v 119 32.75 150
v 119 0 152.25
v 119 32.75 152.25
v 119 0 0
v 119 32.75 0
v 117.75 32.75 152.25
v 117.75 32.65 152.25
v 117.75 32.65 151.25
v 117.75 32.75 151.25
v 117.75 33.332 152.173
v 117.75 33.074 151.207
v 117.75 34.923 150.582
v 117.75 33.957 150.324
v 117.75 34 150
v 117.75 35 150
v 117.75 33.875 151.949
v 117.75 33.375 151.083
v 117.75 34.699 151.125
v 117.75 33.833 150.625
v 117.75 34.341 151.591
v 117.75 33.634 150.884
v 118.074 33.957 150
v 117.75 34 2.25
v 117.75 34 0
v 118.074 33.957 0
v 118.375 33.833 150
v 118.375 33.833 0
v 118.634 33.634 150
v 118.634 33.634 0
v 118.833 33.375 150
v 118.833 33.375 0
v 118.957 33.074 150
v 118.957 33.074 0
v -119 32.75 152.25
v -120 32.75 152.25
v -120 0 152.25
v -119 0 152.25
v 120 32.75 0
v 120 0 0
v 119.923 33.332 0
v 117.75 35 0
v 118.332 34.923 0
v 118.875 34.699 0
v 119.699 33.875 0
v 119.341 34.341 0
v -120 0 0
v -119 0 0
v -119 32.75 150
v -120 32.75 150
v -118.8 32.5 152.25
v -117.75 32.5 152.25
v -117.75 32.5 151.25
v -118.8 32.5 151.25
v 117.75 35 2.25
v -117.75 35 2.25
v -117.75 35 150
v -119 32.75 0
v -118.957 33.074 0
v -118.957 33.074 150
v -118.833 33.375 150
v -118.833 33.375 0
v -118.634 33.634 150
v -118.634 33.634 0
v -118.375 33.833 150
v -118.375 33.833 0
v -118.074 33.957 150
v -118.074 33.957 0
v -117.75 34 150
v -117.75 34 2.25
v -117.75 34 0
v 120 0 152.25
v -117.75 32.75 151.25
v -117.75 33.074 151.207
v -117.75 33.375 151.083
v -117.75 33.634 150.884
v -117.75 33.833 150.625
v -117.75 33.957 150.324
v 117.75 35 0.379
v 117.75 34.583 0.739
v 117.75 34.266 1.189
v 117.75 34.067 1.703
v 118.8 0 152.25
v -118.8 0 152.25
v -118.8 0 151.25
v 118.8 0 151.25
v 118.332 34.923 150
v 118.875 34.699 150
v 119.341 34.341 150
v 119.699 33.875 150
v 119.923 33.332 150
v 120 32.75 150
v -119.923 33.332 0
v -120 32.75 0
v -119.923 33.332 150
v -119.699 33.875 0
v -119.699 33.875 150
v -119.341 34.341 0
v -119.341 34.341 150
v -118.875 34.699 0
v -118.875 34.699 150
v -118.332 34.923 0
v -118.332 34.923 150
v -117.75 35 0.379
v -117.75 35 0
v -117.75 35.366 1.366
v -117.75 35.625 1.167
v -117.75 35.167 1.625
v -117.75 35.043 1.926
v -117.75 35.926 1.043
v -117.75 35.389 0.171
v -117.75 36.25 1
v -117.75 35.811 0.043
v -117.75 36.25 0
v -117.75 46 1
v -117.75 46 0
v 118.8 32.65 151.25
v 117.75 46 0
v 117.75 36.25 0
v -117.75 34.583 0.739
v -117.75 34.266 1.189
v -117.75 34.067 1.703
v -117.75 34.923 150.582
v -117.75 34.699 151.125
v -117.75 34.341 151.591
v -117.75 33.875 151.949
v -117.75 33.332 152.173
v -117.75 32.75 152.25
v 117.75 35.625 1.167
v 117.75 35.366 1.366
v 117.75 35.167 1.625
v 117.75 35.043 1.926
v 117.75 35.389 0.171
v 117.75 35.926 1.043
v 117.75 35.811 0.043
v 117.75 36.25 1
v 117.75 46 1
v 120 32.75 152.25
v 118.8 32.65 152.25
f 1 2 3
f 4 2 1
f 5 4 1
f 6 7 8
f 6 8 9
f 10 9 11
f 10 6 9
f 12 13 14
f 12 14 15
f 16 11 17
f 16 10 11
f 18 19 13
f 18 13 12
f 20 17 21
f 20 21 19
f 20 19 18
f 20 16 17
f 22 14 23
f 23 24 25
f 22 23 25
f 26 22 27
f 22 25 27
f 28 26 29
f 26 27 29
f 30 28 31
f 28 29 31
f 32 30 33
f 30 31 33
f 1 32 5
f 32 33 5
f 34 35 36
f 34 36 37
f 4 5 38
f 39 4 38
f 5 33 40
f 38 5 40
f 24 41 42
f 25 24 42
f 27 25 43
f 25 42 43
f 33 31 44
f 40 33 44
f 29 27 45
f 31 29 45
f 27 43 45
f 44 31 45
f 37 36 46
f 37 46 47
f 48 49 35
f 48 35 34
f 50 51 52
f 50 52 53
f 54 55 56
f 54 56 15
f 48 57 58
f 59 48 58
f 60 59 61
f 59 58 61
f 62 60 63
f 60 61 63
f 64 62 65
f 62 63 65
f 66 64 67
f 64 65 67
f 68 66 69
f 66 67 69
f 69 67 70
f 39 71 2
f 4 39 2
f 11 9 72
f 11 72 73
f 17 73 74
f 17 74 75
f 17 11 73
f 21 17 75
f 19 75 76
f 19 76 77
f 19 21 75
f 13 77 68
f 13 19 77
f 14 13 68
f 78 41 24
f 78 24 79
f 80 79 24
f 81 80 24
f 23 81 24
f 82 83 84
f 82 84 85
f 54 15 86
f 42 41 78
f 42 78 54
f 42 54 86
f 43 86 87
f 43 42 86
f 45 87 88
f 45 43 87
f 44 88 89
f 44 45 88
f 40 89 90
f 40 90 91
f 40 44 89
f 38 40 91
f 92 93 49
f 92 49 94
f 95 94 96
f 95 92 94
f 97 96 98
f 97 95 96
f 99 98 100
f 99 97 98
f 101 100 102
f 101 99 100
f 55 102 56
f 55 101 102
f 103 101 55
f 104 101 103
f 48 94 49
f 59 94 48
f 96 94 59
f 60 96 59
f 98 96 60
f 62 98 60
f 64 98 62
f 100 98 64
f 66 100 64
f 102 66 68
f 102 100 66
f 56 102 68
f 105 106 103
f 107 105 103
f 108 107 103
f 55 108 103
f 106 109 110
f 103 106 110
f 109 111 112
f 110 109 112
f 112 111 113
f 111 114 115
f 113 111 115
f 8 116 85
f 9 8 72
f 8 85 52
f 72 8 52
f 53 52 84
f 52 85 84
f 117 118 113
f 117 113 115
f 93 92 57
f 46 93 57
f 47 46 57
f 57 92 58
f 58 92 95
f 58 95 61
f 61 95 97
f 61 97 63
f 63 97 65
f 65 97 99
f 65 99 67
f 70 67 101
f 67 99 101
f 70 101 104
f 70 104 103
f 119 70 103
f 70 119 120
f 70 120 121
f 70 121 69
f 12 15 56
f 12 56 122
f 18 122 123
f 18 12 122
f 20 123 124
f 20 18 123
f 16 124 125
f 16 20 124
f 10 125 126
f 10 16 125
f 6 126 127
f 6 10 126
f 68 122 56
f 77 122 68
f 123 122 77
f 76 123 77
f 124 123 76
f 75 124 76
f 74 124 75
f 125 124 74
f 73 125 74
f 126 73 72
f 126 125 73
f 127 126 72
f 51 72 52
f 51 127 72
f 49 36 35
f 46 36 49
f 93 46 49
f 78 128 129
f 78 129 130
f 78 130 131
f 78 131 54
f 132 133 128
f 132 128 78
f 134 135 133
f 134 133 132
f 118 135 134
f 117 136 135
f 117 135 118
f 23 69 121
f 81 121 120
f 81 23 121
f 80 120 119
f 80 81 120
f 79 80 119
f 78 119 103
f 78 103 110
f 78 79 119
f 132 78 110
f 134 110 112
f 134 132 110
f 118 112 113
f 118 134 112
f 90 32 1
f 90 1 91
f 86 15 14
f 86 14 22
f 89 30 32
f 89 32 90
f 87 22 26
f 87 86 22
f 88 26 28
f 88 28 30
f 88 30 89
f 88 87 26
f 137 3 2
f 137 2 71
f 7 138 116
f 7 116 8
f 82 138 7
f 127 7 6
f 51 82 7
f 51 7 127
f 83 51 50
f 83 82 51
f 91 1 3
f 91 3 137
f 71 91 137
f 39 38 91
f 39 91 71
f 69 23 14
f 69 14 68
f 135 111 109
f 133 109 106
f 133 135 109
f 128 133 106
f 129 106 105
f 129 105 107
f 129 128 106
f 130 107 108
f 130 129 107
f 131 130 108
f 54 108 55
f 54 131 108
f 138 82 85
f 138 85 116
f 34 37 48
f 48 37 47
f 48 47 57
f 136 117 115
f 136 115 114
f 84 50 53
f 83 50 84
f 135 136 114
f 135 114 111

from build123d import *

# Parameters (mm, degrees)
EXTRUDE1_DEPTH               = 150
SHEET_METAL_1_DEPTH          = 150
SHEET_METAL_1_2_DEPTH        = 150
EDGE_FLANGE1_STRIP_W         = 6.5
EDGE_FLANGE1_STRIP_H         = 1
EDGE_FLANGE1_STRIP_CUT_DEPTH = 235.5
EDGE_FLANGE1_DEPTH           = 235.5
SKETCH16_W                   = 1
SKETCH16_H                   = 32.75
EXTRUDE2_DEPTH               = 2.25
EDGE_FLANGE2_DEPTH           = 235.5
EDGE_FLANGE2_START           = 1
EDGE_FLANGE2_FLAT_DEPTH      = 1


# Read off the part's stored shape, not the designer's step: Преобразовать-Твердое тело1
# Sheet-metal steps are written as plain solids
with BuildPart() as part:
    # Sketch1 → Extrude1 (new body)
    with BuildSketch(Plane.XY):
        Polygon((-120, 0), (-120, 35), (120, 35), (120, 0), (119, 0), (119, 34), (-119, 34), (-119, 0), align=None)
    extrude(amount=EXTRUDE1_DEPTH)

    # Sheet Metal 1 outline → Sheet Metal 1 (cut)
    with BuildSketch(Plane.XY):
        with BuildLine():
            Line((120, 35), (117.75, 35))
            ThreePointArc((117.75, 35), (119.340990258, 34.340990258), (120, 32.75))
            Line((120, 32.75), (120, 35))
        make_face()
        with BuildLine():
            ThreePointArc((-120, 32.75), (-119.340990258, 34.340990258), (-117.75, 35))
            Line((-117.75, 35), (-120, 35))
            Line((-120, 35), (-120, 32.75))
        make_face()
    extrude(amount=SHEET_METAL_1_DEPTH, mode=Mode.SUBTRACT)

    # Sheet Metal 1 2 outline → Sheet Metal 1 2 (add)
    with BuildSketch(Plane.XY):
        with BuildLine():
            Line((119, 34), (117.75, 34))
            ThreePointArc((117.75, 34), (118.633883476, 33.633883476), (119, 32.75))
            Line((119, 32.75), (119, 34))
        make_face()
        with BuildLine():
            ThreePointArc((-119, 32.75), (-118.633883476, 33.633883476), (-117.75, 34))
            Line((-117.75, 34), (-119, 34))
            Line((-119, 34), (-119, 32.75))
        make_face()
    extrude(amount=SHEET_METAL_1_2_DEPTH)

    # Edge-Flange1 strip (across the edge) → Edge-Flange1 strip cut (cut)
    with BuildSketch(Plane(origin=(117.75, 35, 0), x_dir=(0, 0, 1), z_dir=(-1, 0, 0))):
        with Locations((-1, -0.5)):
            Rectangle(EDGE_FLANGE1_STRIP_W, EDGE_FLANGE1_STRIP_H)
    extrude(amount=EDGE_FLANGE1_STRIP_CUT_DEPTH, mode=Mode.SUBTRACT)

    # Edge-Flange1 section (across the edge) → Edge-Flange1 (add)
    with BuildSketch(Plane(origin=(117.75, 35, 0), x_dir=(0, 0, 1), z_dir=(-1, 0, 0))):
        with BuildLine():
            Line((0, 1.25), (0, 11))
            Line((0, 11), (1, 11))
            Line((1, 11), (1, 1.25))
            ThreePointArc((1, 1.25), (1.366116524, 0.366116524), (2.25, 0))
            Line((2.25, 0), (2.25, -1))
            ThreePointArc((2.25, -1), (0.659009742, -0.340990258), (0, 1.25))
        make_face()
    extrude(amount=EDGE_FLANGE1_DEPTH)

    # Sketch16 → Extrude2 (add)
    with BuildSketch(Plane.XY.offset(150)):
        with Locations((-119.5, 16.375)):
            Rectangle(SKETCH16_W, SKETCH16_H)
        with Locations((119.5, 16.375)):
            Rectangle(SKETCH16_W, SKETCH16_H)
    extrude(amount=EXTRUDE2_DEPTH)

    # Edge-Flange2 bend section (across the edge) → Edge-Flange2 (add)
    with BuildSketch(Plane(origin=(117.75, 34, 151.25), x_dir=(0, 0, -1), z_dir=(-1, 0, 0))):
        with BuildLine():
            Line((-1, 1.25), (0, 1.25))
            ThreePointArc((0, 1.25), (0.366116524, 0.366116524), (1.25, 0))
            Line((1.25, 0), (1.25, -1))
            ThreePointArc((1.25, -1), (-0.340990258, -0.340990258), (-1, 1.25))
        make_face()
    extrude(amount=EDGE_FLANGE2_DEPTH)

    # Edge-Flange2 profile (on flange) → Edge-Flange2 flat (add)
    with BuildSketch(Plane(origin=(0, 34, 151.25), x_dir=(-1, 0, 0), z_dir=(0, 0, 1)).offset(EDGE_FLANGE2_START)):
        Polygon((-117.75, 1.35), (-117.75, 1.25), (117.75, 1.25), (117.75, 1.5), (118.8, 1.5), (118.8, 34), (-118.8, 34), (-118.8, 1.35), align=None)
    extrude(amount=-EDGE_FLANGE2_FLAT_DEPTH)


solid = part.part
